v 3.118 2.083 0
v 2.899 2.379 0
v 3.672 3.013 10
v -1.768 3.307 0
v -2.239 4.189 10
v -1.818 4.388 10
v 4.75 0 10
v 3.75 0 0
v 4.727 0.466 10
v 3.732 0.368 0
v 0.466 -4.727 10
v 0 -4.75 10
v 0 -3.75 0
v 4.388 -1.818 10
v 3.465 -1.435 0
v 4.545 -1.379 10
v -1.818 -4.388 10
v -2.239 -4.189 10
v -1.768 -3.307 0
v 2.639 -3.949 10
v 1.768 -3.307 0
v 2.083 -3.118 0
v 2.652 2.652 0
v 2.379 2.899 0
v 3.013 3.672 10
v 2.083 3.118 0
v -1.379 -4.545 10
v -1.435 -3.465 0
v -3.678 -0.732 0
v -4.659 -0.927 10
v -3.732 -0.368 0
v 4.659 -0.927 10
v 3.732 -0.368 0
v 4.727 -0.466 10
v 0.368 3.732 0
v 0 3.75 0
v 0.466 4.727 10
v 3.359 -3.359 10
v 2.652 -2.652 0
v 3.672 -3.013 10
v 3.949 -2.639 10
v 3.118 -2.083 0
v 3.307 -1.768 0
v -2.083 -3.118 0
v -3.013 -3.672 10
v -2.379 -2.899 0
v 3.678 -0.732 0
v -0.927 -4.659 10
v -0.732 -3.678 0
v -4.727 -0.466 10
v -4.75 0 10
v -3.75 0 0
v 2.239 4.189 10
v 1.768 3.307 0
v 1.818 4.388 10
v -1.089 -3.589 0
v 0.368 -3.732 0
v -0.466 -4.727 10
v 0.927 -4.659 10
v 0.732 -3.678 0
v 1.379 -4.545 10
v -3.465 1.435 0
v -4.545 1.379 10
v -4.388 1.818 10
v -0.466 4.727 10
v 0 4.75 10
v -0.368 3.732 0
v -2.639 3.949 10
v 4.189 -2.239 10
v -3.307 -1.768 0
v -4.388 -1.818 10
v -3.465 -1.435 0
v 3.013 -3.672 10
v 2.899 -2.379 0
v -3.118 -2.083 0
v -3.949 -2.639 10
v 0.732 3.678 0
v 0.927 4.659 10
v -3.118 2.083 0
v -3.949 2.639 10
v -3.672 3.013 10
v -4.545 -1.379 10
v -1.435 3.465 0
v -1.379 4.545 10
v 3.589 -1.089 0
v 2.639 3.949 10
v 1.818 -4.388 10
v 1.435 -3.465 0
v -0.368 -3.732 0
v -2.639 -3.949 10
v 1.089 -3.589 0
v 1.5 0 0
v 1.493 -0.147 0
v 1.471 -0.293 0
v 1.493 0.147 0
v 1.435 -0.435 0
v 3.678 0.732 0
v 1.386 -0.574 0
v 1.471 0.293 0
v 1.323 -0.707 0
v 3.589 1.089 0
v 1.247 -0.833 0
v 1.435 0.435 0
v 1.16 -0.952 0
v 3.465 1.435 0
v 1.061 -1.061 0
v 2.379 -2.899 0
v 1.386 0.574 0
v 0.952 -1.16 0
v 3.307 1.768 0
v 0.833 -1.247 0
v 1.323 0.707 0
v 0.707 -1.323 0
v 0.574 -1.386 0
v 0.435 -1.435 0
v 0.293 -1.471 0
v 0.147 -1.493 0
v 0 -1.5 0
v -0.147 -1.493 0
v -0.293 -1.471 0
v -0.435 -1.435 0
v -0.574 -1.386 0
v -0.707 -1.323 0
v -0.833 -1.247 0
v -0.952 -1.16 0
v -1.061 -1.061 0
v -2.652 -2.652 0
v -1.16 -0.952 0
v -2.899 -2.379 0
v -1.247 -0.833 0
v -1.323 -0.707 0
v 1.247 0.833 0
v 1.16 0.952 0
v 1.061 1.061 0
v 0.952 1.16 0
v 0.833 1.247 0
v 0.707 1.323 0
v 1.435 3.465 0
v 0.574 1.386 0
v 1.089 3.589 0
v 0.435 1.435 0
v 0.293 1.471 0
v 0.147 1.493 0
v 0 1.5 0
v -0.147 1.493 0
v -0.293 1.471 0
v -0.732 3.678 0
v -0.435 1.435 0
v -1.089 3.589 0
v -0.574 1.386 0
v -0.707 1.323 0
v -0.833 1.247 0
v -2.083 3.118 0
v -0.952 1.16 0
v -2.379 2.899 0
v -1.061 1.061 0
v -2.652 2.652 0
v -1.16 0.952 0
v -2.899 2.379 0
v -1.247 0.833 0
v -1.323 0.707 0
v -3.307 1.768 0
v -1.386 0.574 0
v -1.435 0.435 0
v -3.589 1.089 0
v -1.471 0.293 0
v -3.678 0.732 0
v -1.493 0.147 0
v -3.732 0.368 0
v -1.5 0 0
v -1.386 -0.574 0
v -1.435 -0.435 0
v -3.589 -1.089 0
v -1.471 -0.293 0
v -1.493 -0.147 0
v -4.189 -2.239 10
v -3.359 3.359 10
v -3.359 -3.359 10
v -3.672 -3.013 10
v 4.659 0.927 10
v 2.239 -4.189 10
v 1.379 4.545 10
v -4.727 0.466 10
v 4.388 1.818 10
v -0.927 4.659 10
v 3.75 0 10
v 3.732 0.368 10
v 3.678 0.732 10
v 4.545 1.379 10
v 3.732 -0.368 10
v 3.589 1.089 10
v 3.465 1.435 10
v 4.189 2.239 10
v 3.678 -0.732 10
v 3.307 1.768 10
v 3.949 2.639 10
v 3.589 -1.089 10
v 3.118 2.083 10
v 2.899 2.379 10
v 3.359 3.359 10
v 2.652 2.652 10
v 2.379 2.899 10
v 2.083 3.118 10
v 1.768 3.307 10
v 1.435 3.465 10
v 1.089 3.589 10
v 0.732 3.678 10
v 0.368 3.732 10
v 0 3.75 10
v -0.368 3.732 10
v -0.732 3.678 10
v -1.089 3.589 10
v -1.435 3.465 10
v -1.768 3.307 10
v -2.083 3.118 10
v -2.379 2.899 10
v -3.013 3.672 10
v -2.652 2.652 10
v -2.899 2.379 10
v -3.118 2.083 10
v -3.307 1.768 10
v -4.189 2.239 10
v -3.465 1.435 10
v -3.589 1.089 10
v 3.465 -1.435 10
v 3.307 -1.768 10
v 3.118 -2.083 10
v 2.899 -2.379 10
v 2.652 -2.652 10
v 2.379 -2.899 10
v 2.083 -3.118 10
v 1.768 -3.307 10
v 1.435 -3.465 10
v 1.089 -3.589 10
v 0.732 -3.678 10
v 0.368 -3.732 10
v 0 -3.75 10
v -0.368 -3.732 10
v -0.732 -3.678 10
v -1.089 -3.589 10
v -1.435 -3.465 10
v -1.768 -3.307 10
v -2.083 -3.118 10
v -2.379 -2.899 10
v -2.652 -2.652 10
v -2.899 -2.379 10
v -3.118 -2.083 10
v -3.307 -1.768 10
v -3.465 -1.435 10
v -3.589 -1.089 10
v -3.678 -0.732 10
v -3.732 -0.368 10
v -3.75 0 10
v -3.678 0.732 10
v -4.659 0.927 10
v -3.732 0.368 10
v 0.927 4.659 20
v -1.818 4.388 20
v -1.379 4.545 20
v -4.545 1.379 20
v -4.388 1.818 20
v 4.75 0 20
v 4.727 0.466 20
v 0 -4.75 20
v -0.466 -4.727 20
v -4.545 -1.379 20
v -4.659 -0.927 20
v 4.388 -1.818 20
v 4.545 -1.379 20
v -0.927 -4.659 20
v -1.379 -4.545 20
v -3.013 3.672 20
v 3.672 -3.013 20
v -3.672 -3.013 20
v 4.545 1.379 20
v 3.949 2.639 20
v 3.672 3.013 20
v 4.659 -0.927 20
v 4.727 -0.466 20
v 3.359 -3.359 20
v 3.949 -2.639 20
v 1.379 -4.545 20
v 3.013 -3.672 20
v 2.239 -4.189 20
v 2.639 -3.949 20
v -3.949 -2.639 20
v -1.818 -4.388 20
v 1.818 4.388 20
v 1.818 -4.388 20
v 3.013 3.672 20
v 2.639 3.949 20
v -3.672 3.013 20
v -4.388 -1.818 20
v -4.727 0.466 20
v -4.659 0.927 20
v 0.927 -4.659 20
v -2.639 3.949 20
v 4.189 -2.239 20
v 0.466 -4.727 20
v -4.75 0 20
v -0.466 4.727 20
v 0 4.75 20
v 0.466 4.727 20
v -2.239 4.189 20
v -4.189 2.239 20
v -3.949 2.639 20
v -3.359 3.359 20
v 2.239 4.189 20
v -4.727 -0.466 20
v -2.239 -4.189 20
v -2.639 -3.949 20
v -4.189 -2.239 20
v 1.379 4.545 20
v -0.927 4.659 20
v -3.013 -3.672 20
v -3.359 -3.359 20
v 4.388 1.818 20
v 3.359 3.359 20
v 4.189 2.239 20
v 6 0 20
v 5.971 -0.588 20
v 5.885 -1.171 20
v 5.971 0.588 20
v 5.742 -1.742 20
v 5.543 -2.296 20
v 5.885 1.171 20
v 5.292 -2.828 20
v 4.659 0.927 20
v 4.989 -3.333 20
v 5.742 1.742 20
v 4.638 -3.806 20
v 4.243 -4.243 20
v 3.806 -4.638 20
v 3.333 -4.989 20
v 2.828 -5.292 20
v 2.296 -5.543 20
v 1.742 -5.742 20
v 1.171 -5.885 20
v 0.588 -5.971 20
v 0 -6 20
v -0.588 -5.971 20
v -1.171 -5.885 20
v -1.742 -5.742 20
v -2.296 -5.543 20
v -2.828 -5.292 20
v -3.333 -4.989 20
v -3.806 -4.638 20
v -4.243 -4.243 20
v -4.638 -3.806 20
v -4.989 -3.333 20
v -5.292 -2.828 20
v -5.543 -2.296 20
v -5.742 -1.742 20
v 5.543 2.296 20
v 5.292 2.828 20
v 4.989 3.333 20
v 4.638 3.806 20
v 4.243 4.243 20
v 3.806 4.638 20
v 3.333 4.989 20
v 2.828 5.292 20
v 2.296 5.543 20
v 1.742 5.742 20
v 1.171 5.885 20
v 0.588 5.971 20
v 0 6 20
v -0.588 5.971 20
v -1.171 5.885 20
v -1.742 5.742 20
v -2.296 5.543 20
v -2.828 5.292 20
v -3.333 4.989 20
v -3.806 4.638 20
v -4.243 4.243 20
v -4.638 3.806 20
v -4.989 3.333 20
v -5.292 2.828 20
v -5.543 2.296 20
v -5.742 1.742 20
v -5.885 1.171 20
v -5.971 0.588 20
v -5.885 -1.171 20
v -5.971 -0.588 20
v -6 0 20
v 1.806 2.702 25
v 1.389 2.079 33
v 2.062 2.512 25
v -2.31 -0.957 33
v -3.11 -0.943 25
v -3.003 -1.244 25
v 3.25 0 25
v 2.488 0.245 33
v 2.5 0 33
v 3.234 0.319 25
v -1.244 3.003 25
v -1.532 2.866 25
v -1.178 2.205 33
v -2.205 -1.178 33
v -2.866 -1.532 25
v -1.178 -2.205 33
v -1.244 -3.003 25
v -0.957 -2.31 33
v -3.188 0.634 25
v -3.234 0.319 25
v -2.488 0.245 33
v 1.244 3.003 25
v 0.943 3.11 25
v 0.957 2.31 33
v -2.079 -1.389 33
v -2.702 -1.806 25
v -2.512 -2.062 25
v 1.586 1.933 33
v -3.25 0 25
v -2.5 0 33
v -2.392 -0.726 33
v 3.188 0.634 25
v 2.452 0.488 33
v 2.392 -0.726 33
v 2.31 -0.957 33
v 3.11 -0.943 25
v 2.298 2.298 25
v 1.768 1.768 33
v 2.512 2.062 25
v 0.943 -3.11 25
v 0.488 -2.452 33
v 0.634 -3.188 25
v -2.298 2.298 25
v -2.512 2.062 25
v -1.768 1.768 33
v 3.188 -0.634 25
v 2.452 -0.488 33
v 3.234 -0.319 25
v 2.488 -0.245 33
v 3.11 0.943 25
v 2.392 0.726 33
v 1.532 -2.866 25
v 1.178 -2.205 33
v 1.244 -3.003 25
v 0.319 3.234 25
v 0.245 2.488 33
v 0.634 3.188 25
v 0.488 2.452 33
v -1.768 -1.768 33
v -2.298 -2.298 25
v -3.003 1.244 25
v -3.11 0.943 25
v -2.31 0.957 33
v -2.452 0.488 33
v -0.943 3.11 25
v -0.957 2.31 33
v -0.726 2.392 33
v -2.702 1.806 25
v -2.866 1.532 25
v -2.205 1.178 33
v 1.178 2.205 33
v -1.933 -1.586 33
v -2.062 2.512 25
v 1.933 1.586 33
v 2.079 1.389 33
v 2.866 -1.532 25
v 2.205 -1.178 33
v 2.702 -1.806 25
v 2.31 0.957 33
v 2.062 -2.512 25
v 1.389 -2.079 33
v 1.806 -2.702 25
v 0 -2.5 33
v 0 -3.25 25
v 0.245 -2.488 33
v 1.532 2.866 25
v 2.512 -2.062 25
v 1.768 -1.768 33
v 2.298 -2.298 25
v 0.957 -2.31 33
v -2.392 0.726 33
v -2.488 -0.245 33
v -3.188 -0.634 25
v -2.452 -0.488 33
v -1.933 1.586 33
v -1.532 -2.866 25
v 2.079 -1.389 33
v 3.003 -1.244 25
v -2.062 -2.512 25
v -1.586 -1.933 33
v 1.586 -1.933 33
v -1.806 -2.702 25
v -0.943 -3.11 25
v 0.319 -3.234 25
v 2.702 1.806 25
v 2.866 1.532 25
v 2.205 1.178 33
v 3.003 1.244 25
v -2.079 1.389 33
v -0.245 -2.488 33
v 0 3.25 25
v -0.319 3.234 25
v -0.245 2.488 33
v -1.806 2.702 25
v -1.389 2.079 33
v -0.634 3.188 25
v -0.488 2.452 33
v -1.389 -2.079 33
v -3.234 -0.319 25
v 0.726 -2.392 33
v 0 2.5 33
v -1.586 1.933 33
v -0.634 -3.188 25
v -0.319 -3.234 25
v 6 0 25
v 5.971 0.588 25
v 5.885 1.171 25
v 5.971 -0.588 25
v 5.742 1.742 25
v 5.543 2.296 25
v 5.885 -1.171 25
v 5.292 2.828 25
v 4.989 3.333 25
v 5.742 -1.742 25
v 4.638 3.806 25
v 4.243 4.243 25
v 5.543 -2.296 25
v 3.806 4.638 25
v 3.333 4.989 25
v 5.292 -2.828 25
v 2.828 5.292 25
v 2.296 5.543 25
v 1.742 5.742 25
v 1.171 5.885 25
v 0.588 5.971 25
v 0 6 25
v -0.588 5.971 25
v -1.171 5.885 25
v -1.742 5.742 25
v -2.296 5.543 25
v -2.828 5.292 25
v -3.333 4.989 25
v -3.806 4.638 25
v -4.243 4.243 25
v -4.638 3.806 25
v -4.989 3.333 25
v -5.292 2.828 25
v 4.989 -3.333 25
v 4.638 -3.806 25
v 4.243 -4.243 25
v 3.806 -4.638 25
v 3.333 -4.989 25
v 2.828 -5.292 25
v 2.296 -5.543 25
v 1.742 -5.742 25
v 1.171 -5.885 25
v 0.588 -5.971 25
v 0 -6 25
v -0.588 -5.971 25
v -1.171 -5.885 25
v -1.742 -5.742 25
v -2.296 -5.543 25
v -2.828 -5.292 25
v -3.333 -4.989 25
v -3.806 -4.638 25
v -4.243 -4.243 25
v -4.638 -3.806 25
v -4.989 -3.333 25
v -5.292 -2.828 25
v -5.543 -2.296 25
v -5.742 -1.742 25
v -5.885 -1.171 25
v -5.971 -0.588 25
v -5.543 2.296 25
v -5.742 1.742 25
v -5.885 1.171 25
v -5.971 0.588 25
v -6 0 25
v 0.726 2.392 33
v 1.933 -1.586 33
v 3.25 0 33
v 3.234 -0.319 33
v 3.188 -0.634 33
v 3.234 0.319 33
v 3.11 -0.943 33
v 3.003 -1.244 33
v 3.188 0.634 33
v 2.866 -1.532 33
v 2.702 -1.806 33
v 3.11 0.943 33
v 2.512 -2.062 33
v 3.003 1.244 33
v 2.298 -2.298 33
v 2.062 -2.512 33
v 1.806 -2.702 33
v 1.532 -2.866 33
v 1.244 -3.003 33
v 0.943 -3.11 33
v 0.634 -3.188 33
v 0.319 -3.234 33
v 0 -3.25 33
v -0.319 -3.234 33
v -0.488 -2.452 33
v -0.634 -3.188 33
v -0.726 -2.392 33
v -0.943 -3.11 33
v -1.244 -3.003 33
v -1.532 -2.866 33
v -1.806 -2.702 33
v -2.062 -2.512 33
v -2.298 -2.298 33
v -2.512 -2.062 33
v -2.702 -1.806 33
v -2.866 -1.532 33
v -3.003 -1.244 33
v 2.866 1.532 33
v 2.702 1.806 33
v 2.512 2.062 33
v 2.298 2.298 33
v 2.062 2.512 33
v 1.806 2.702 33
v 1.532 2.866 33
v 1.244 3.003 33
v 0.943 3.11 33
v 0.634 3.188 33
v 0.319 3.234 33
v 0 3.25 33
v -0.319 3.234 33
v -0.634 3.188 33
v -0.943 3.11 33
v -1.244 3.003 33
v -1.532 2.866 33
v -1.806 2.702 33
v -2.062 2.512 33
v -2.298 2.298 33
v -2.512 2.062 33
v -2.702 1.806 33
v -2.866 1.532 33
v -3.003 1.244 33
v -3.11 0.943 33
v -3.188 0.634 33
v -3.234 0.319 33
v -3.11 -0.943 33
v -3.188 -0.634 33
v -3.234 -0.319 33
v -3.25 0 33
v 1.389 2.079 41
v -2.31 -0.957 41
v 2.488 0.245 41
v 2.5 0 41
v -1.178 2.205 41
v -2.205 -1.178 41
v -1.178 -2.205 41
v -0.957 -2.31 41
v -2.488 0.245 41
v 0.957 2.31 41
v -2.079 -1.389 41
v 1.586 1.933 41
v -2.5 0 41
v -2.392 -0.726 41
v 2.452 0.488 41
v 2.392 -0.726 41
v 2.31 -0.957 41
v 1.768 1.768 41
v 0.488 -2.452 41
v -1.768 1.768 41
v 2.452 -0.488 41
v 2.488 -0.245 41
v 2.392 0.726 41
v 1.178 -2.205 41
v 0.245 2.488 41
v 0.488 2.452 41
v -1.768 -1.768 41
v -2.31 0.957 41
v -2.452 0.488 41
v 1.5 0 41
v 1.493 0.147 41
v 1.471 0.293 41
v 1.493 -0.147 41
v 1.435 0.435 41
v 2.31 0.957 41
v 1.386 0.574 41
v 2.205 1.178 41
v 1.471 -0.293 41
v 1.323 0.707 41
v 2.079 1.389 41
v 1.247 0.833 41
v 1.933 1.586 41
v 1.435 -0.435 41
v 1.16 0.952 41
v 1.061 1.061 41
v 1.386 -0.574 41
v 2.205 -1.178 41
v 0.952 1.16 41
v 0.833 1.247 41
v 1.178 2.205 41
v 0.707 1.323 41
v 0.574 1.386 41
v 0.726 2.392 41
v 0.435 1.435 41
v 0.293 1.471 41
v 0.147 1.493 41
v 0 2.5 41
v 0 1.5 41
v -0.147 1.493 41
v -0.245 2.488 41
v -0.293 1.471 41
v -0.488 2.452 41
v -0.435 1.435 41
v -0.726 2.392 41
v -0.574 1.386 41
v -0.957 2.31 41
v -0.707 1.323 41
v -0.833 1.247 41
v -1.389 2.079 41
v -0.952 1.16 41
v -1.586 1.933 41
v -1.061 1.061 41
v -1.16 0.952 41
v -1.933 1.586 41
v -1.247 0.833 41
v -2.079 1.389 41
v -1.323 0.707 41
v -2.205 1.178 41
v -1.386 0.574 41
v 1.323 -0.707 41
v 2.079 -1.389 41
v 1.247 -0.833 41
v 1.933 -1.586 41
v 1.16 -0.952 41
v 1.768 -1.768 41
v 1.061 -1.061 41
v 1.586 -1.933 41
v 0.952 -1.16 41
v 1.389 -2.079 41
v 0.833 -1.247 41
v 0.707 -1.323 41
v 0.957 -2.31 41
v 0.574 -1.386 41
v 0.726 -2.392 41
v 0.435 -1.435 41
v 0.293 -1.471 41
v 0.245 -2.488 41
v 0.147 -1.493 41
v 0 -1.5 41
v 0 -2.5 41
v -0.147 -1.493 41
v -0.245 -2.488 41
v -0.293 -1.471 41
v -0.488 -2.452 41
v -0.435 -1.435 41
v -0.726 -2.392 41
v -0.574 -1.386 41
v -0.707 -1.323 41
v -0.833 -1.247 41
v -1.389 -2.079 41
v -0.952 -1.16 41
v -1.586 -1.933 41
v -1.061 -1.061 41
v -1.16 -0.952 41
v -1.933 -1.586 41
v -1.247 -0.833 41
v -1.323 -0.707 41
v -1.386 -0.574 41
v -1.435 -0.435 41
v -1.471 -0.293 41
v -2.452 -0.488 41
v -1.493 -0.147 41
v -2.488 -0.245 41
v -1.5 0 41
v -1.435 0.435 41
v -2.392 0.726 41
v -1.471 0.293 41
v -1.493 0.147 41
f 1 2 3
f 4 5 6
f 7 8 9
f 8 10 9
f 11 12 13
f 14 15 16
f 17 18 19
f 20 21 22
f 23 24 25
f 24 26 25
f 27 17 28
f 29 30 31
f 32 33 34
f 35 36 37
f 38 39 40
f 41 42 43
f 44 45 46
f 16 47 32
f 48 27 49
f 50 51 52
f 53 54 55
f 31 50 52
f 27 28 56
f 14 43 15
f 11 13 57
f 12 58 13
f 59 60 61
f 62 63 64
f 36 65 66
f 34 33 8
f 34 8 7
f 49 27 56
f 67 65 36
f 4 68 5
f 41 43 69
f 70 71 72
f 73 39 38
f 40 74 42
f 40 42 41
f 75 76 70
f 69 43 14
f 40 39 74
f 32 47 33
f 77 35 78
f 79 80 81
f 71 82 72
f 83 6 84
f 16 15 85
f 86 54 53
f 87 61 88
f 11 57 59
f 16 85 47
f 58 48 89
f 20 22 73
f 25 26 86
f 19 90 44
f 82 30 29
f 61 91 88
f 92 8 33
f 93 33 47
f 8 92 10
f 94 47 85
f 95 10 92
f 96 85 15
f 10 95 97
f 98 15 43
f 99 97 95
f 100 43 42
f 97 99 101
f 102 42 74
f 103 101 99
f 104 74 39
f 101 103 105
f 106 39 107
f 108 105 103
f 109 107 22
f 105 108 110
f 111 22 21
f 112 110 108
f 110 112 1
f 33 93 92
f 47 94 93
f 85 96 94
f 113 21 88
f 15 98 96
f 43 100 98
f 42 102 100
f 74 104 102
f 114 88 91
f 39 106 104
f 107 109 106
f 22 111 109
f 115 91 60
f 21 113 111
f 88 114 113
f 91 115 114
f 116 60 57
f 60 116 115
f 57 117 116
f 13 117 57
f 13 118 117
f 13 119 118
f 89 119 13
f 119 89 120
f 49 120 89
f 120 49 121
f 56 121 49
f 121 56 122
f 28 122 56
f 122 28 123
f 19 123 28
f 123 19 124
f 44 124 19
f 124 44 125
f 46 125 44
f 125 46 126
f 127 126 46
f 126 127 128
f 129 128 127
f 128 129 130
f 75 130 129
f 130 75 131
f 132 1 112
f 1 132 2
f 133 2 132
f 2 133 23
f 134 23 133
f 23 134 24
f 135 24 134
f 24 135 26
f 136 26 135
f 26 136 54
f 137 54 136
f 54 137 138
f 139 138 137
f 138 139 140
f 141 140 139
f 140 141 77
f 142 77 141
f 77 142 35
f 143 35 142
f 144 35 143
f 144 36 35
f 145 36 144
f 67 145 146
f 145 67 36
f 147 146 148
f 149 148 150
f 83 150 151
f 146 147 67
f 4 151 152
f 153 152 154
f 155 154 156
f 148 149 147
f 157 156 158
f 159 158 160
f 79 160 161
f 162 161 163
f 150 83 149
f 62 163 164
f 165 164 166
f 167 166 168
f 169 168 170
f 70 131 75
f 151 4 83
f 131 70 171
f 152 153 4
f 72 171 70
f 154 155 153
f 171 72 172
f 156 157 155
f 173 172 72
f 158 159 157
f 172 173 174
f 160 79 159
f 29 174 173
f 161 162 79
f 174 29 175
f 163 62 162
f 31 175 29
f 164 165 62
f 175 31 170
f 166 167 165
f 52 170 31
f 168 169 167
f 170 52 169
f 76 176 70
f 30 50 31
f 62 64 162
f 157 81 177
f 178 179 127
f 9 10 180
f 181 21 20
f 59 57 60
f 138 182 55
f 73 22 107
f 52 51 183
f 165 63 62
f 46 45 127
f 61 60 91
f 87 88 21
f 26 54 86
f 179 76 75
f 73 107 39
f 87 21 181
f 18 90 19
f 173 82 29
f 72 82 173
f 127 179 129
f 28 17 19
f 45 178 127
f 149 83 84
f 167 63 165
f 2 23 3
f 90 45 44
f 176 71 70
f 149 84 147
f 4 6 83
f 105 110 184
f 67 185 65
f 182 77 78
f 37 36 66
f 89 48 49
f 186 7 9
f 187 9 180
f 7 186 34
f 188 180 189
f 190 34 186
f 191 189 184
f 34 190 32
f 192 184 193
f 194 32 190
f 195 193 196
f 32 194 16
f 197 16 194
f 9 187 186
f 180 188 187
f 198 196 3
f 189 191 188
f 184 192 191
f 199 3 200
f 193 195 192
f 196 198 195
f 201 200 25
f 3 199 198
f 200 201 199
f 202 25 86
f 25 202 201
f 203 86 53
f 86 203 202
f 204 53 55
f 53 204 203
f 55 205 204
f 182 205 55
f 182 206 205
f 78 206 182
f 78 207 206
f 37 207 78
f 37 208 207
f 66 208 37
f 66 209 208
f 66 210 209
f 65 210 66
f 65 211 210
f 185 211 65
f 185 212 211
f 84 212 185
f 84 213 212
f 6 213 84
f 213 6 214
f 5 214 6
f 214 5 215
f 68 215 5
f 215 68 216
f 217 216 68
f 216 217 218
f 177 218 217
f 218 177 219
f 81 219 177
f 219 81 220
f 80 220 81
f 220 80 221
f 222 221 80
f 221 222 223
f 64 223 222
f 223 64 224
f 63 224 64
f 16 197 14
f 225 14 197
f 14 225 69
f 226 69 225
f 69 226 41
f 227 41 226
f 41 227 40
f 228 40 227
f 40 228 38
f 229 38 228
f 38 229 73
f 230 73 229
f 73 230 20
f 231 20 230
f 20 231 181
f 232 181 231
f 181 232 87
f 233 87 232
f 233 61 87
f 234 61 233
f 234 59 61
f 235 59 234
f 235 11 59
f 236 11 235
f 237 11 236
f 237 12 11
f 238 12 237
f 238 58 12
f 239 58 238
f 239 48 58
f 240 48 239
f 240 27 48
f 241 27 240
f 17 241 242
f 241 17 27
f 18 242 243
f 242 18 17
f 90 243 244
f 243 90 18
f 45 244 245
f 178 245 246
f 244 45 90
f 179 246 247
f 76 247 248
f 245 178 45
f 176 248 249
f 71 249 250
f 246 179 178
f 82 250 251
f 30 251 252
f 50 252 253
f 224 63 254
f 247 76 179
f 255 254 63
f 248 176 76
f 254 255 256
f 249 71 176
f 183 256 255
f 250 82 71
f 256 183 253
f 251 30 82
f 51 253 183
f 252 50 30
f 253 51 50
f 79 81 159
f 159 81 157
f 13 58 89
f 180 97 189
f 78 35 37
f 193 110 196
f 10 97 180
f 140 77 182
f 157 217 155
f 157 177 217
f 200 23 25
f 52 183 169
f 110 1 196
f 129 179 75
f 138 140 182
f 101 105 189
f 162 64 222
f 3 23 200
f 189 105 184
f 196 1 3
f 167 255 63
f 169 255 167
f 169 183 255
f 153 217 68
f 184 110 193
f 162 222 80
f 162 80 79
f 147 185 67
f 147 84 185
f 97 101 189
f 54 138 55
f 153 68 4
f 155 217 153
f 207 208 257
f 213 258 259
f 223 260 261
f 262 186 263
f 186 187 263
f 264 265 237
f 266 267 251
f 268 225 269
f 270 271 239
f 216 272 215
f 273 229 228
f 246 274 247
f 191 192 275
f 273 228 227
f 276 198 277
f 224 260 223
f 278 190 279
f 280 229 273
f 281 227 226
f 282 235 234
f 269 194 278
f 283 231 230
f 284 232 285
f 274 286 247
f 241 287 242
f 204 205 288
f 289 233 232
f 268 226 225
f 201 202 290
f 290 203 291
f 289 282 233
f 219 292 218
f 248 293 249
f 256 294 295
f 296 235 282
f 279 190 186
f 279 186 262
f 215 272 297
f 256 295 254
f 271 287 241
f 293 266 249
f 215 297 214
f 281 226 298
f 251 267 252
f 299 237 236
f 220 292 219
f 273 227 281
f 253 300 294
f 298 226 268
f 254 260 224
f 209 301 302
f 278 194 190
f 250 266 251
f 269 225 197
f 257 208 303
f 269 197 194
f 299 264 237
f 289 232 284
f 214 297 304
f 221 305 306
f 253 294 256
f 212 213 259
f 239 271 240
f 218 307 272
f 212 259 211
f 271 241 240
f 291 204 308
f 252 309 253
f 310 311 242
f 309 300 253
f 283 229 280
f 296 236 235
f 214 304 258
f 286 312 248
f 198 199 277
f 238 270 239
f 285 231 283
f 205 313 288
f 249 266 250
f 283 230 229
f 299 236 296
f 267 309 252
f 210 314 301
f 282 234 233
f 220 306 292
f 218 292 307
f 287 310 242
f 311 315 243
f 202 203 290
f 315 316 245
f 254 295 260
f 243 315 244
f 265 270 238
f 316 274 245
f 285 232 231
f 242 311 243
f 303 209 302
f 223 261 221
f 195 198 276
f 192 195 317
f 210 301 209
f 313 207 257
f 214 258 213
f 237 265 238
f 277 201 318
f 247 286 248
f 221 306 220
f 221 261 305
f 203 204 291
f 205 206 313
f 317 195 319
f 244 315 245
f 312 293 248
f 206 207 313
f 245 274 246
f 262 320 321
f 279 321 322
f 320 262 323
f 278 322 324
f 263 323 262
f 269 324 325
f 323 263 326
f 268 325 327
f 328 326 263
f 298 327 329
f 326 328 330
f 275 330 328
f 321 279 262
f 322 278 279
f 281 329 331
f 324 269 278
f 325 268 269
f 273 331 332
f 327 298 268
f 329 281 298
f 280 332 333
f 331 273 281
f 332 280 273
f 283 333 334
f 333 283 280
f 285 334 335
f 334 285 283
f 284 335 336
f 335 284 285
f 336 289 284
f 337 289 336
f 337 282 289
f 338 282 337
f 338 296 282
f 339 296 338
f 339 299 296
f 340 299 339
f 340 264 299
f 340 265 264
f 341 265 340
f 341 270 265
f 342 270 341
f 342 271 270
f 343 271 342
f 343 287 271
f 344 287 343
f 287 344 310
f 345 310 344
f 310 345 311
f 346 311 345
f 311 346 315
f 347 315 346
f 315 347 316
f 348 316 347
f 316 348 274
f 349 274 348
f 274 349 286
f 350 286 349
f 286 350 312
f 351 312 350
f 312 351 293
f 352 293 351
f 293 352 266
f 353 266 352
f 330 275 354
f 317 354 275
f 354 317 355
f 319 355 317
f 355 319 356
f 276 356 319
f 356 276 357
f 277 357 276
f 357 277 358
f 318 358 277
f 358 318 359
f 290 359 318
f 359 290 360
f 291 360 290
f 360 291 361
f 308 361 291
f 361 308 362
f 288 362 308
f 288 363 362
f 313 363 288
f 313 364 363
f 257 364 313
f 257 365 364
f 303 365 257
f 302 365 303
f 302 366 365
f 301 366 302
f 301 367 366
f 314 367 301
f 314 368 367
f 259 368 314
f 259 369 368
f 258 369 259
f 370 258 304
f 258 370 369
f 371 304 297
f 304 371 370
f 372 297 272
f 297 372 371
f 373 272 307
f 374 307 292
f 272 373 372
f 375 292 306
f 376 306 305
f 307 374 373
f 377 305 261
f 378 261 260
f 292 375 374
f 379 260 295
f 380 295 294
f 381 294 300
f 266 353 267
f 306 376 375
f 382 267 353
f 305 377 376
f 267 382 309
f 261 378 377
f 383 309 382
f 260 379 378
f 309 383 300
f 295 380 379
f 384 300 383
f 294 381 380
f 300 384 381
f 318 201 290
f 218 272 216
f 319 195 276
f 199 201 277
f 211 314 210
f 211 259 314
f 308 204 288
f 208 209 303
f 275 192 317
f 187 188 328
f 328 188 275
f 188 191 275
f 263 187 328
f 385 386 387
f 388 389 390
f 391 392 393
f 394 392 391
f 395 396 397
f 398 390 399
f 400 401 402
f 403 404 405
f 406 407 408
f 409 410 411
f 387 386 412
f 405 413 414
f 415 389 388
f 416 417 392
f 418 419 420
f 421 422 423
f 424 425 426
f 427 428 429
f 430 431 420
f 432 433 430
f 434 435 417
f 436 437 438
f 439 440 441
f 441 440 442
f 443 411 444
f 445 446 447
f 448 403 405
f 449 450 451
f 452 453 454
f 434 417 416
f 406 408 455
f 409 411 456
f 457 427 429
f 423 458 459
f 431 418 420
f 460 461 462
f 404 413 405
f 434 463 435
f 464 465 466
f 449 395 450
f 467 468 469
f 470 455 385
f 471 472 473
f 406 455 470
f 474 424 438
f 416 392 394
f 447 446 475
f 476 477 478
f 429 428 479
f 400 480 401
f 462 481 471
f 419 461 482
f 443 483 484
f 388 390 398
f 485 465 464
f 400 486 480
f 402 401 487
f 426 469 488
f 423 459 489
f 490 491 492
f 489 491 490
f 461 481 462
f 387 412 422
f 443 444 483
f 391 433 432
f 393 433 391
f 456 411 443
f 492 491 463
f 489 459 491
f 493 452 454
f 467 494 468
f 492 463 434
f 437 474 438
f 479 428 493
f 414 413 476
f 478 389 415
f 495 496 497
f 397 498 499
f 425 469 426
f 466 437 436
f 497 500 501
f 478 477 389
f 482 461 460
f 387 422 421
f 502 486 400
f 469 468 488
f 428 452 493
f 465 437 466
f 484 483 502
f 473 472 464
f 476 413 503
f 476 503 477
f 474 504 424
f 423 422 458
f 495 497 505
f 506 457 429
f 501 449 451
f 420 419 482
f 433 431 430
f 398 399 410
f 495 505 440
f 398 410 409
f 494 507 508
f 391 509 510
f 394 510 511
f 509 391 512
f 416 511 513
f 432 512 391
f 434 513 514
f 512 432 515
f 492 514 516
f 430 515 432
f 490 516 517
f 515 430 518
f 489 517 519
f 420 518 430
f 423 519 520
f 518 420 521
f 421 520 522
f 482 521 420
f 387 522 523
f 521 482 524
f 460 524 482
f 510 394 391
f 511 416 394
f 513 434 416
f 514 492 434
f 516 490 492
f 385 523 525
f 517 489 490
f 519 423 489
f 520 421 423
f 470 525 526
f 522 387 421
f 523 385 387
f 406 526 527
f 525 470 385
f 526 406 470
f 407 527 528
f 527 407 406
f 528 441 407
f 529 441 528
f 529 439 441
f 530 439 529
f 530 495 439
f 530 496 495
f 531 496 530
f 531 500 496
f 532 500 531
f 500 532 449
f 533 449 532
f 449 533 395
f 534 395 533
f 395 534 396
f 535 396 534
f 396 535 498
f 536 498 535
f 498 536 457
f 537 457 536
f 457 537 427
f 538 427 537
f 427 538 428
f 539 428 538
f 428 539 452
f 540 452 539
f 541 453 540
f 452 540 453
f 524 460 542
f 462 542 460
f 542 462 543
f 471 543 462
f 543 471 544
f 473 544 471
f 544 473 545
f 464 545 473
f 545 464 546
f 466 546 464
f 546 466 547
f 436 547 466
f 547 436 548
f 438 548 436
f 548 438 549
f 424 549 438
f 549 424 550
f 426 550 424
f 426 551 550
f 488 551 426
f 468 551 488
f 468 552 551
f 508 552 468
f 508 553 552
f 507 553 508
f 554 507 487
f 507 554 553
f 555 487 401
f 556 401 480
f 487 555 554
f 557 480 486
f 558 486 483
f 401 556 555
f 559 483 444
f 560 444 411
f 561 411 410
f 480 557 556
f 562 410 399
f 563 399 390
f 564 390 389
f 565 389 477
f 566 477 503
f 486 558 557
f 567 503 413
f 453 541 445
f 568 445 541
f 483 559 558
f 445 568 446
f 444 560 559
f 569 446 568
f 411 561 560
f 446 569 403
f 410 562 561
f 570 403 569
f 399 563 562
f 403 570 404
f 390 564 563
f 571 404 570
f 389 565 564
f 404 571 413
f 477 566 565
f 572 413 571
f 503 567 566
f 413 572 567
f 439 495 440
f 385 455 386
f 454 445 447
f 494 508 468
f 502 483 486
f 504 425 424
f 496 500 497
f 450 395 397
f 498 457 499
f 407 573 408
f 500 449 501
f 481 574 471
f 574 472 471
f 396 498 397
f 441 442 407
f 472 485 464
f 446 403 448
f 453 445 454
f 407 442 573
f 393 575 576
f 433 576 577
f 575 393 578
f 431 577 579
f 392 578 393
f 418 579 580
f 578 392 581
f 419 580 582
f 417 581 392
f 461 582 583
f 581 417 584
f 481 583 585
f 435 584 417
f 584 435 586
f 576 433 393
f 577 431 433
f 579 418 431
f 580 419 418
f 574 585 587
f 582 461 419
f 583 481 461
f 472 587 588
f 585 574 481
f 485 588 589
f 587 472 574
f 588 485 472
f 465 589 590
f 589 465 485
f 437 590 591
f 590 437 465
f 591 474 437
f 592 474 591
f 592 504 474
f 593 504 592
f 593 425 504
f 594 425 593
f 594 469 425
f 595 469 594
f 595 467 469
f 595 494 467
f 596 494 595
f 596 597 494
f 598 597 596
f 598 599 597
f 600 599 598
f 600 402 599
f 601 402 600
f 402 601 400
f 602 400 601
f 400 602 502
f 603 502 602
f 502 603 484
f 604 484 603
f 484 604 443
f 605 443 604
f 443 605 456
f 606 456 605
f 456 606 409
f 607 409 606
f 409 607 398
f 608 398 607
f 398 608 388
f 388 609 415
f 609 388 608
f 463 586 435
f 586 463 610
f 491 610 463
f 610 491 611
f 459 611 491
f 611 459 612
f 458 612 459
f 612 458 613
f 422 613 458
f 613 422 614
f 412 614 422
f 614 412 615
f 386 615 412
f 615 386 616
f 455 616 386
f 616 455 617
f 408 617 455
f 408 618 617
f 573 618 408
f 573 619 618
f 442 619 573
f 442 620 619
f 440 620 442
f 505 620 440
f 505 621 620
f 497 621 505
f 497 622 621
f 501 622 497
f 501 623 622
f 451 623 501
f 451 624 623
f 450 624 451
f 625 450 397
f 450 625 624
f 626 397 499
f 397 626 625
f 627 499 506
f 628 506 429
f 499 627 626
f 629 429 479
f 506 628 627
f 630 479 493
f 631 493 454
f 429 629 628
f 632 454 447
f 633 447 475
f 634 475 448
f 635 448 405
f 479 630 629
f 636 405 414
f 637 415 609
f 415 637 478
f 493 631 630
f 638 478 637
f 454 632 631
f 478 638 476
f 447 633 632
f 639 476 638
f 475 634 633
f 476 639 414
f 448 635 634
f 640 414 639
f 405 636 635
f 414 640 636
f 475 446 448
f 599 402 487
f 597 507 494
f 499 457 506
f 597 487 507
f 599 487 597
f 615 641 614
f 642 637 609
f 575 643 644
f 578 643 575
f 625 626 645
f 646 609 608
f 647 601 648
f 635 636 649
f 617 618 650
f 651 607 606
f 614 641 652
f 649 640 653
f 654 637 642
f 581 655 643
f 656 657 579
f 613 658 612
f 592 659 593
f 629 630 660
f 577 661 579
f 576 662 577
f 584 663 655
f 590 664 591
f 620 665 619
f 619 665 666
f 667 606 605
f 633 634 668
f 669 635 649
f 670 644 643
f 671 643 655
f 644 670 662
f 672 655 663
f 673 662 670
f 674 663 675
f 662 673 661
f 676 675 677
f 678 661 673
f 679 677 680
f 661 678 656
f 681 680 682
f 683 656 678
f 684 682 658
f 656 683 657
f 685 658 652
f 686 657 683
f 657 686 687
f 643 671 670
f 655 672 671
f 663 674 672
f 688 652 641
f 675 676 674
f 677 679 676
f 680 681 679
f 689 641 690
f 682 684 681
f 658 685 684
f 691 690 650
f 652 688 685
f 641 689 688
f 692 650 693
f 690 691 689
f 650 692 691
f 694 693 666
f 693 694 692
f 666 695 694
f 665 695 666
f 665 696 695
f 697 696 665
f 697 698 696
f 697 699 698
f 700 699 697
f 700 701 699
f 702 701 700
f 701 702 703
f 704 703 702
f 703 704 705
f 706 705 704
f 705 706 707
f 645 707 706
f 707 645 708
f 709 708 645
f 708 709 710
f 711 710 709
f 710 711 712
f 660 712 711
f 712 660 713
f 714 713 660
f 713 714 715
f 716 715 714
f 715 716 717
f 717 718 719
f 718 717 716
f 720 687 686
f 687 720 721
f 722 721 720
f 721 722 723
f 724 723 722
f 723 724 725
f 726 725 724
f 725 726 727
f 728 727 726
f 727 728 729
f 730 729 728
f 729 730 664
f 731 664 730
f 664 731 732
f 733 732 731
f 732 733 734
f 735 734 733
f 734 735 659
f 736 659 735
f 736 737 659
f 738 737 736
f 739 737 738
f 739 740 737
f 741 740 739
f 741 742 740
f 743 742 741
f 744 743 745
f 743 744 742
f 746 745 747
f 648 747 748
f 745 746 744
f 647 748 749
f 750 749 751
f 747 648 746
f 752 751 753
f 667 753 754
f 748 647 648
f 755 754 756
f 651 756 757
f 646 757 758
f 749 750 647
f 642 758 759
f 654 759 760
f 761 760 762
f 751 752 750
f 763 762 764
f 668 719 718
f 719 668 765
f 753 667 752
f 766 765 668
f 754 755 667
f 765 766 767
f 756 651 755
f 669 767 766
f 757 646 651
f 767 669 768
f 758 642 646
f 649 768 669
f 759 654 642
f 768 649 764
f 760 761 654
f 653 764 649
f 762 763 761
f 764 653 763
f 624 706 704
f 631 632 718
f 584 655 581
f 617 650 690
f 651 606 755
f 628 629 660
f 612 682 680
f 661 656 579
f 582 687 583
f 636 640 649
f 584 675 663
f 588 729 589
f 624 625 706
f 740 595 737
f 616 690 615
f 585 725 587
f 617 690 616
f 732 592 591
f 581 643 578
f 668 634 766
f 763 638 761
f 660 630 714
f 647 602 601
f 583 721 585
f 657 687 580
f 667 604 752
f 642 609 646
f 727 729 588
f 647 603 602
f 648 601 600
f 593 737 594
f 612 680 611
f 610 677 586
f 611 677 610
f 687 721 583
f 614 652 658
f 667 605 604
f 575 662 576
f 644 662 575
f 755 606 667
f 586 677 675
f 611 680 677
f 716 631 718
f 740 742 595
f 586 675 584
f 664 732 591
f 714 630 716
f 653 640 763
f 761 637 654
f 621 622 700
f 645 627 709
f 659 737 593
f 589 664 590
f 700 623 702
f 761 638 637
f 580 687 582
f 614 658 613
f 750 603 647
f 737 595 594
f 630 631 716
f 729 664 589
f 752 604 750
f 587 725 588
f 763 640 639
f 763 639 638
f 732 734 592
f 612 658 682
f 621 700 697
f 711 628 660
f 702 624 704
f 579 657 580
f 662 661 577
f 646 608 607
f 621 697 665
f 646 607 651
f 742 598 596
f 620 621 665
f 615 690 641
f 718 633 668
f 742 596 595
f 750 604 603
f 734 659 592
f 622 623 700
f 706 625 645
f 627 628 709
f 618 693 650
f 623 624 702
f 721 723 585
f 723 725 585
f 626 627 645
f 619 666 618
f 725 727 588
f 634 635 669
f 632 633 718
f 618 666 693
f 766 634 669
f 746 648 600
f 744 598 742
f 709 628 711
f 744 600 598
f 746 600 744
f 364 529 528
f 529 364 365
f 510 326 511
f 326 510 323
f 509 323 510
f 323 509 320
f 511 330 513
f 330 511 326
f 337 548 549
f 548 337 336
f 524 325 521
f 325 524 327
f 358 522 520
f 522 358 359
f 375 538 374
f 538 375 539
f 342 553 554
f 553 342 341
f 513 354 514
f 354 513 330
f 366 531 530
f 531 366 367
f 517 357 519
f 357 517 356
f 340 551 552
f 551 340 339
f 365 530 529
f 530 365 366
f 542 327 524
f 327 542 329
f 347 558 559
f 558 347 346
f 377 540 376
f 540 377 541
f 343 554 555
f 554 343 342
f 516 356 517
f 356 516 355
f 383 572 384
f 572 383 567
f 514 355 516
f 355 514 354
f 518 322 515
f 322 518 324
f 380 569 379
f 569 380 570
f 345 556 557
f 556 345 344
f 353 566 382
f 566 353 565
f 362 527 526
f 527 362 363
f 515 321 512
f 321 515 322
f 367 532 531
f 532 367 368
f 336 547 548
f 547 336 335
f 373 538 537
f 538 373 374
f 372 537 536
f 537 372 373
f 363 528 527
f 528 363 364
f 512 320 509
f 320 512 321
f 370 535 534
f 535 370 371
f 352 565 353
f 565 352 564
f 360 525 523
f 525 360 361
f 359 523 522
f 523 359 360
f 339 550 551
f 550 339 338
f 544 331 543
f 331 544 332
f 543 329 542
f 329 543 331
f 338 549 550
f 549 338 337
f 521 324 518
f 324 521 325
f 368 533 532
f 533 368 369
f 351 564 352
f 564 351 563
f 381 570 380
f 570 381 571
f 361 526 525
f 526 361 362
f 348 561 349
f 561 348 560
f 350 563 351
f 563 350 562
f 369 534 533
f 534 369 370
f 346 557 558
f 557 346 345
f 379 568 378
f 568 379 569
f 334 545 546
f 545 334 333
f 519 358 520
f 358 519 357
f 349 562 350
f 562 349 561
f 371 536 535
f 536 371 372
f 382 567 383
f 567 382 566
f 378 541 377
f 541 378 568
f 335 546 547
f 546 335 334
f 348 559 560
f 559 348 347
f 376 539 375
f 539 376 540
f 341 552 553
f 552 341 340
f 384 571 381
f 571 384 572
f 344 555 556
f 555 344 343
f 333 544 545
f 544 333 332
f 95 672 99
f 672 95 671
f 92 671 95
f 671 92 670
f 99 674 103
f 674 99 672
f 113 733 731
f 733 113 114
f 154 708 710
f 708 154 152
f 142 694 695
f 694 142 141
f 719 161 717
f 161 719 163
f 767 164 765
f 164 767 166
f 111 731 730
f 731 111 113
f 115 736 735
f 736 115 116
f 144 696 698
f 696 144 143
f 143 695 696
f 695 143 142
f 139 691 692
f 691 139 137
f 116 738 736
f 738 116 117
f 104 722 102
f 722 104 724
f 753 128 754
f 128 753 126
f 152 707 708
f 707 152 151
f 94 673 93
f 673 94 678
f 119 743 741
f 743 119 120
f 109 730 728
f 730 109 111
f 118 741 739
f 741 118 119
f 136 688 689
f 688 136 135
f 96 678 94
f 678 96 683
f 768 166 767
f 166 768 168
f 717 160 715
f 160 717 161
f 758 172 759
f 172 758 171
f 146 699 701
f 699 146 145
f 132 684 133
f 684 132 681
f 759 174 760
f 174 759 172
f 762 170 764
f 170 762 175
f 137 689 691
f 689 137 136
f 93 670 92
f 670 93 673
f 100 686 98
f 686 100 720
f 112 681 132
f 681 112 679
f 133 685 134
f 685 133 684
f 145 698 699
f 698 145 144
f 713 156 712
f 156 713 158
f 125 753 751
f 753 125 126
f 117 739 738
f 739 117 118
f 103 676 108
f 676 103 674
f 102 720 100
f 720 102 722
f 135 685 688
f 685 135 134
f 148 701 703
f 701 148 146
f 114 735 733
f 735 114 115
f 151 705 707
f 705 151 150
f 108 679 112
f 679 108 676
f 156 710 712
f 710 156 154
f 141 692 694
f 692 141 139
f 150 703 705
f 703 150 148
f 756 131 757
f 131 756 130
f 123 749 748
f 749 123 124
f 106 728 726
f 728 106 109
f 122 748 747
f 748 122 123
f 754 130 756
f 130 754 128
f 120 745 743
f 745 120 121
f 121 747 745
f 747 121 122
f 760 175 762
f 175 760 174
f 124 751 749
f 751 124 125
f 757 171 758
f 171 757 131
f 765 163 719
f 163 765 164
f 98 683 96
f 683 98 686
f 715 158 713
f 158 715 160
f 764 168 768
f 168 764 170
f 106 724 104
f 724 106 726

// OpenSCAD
// Straight hose-barb reducer
// Designed for 8mm and 5mm ID tubing with a 3mm central bore.

// --- Dimensions ---
bore_d = 3.0;               // Central bore diameter
barb8_h = 10.0;            // Height of one 8mm barb segment
barb8_d_bot = 7.5;         // Bottom diameter of 8mm barb
barb8_d_top = 9.5;         // Top diameter of 8mm barb
collar_d = 12.0;           // Diameter of the middle collar
collar_h = 5.0;            // Height of the middle collar (25 - 20)
barb5_h = 8.0;             // Height of one 5mm barb segment
barb5_d_bot = 6.5;         // Bottom diameter of 5mm barb
barb5_d_top = 5.0;         // Top diameter of 5mm barb

// --- Derived Geometry ---
// Total height calculation:
// 8mm section: 2 barbs * 10mm = 20mm (z=0 to 20)
// Collar: 5mm (z=20 to 25)
// 5mm section: 2 barbs * 8mm = 16mm (z=25 to 41)
total_h = 41.0;

$fn = 64;

// --- Modules ---

// A single barb segment using a cone/cylinder approach
// type 1: grows from d_bot to d_top then steps back to d_bot
// type 2: shrinks from d_bot to d_top then steps back to d_bot
module barb_segment(h, d_start, d_end, is_growing) {
    if (is_growing) {
        // Grows from d_start to d_end
        cylinder(h = h, d1 = d_start, d2 = d_end);
        // Step back to d_start (the "sawtooth" base)
        translate([0, 0, 0]) cylinder(h = 0.01, d = d_start); 
    } else {
        // Shrinks from d_start to d_end
        cylinder(h = h, d1 = d_start, d2 = d_end);
    }
}

// Corrected Barb Segment to match "step straight back" description
module barb_profile(h, d_bot, d_top, growing) {
    // The barb is a frustum (cone)
    // "then steps straight back to [original diameter]" implies the base of the next barb
    // or the shoulder of the current one is the original diameter.
    // We model the frustum part.
    cylinder(h = h, d1 = d_bot, d2 = d_top);
}

module barb8_stack() {
    // Two identical barbs, each 10mm tall
    // Barb 1: z=0 to 10, Barb 2: z=10 to 20
    for (z_offset = [0, 10]) {
        translate([0, 0, z_offset])
        cylinder(h = 10, d1 = 7.5, d2 = 9.5);
    }
}

module barb5_stack() {
    // Two identical barbs, each 8mm tall
    // Barb 1: z=25 to 33, Barb 2: z=33 to 41
    for (z_offset = [0, 8]) {
        translate([0, 0, z_offset])
        cylinder(h = 8, d1 = 6.5, d2 = 5.0);
    }
}

// --- Main Assembly ---

difference() {
    union() {
        // 8mm Barb Section (z=0 to 20)
        barb8_stack();
        
        // Collar Section (z=20 to 25)
        translate([0, 0, 20])
        cylinder(h = 5, d = 12);
        
        // 5mm Barb Section (z=25 to 41)
        translate([0, 0, 25])
        barb5_stack();
    }
    
    // Central Bore (runs through full length)
    // We extend the cylinder slightly to ensure a clean cut
    translate([0, 0, -1])
    cylinder(h = total_h + 2, d = bore_d);
}
